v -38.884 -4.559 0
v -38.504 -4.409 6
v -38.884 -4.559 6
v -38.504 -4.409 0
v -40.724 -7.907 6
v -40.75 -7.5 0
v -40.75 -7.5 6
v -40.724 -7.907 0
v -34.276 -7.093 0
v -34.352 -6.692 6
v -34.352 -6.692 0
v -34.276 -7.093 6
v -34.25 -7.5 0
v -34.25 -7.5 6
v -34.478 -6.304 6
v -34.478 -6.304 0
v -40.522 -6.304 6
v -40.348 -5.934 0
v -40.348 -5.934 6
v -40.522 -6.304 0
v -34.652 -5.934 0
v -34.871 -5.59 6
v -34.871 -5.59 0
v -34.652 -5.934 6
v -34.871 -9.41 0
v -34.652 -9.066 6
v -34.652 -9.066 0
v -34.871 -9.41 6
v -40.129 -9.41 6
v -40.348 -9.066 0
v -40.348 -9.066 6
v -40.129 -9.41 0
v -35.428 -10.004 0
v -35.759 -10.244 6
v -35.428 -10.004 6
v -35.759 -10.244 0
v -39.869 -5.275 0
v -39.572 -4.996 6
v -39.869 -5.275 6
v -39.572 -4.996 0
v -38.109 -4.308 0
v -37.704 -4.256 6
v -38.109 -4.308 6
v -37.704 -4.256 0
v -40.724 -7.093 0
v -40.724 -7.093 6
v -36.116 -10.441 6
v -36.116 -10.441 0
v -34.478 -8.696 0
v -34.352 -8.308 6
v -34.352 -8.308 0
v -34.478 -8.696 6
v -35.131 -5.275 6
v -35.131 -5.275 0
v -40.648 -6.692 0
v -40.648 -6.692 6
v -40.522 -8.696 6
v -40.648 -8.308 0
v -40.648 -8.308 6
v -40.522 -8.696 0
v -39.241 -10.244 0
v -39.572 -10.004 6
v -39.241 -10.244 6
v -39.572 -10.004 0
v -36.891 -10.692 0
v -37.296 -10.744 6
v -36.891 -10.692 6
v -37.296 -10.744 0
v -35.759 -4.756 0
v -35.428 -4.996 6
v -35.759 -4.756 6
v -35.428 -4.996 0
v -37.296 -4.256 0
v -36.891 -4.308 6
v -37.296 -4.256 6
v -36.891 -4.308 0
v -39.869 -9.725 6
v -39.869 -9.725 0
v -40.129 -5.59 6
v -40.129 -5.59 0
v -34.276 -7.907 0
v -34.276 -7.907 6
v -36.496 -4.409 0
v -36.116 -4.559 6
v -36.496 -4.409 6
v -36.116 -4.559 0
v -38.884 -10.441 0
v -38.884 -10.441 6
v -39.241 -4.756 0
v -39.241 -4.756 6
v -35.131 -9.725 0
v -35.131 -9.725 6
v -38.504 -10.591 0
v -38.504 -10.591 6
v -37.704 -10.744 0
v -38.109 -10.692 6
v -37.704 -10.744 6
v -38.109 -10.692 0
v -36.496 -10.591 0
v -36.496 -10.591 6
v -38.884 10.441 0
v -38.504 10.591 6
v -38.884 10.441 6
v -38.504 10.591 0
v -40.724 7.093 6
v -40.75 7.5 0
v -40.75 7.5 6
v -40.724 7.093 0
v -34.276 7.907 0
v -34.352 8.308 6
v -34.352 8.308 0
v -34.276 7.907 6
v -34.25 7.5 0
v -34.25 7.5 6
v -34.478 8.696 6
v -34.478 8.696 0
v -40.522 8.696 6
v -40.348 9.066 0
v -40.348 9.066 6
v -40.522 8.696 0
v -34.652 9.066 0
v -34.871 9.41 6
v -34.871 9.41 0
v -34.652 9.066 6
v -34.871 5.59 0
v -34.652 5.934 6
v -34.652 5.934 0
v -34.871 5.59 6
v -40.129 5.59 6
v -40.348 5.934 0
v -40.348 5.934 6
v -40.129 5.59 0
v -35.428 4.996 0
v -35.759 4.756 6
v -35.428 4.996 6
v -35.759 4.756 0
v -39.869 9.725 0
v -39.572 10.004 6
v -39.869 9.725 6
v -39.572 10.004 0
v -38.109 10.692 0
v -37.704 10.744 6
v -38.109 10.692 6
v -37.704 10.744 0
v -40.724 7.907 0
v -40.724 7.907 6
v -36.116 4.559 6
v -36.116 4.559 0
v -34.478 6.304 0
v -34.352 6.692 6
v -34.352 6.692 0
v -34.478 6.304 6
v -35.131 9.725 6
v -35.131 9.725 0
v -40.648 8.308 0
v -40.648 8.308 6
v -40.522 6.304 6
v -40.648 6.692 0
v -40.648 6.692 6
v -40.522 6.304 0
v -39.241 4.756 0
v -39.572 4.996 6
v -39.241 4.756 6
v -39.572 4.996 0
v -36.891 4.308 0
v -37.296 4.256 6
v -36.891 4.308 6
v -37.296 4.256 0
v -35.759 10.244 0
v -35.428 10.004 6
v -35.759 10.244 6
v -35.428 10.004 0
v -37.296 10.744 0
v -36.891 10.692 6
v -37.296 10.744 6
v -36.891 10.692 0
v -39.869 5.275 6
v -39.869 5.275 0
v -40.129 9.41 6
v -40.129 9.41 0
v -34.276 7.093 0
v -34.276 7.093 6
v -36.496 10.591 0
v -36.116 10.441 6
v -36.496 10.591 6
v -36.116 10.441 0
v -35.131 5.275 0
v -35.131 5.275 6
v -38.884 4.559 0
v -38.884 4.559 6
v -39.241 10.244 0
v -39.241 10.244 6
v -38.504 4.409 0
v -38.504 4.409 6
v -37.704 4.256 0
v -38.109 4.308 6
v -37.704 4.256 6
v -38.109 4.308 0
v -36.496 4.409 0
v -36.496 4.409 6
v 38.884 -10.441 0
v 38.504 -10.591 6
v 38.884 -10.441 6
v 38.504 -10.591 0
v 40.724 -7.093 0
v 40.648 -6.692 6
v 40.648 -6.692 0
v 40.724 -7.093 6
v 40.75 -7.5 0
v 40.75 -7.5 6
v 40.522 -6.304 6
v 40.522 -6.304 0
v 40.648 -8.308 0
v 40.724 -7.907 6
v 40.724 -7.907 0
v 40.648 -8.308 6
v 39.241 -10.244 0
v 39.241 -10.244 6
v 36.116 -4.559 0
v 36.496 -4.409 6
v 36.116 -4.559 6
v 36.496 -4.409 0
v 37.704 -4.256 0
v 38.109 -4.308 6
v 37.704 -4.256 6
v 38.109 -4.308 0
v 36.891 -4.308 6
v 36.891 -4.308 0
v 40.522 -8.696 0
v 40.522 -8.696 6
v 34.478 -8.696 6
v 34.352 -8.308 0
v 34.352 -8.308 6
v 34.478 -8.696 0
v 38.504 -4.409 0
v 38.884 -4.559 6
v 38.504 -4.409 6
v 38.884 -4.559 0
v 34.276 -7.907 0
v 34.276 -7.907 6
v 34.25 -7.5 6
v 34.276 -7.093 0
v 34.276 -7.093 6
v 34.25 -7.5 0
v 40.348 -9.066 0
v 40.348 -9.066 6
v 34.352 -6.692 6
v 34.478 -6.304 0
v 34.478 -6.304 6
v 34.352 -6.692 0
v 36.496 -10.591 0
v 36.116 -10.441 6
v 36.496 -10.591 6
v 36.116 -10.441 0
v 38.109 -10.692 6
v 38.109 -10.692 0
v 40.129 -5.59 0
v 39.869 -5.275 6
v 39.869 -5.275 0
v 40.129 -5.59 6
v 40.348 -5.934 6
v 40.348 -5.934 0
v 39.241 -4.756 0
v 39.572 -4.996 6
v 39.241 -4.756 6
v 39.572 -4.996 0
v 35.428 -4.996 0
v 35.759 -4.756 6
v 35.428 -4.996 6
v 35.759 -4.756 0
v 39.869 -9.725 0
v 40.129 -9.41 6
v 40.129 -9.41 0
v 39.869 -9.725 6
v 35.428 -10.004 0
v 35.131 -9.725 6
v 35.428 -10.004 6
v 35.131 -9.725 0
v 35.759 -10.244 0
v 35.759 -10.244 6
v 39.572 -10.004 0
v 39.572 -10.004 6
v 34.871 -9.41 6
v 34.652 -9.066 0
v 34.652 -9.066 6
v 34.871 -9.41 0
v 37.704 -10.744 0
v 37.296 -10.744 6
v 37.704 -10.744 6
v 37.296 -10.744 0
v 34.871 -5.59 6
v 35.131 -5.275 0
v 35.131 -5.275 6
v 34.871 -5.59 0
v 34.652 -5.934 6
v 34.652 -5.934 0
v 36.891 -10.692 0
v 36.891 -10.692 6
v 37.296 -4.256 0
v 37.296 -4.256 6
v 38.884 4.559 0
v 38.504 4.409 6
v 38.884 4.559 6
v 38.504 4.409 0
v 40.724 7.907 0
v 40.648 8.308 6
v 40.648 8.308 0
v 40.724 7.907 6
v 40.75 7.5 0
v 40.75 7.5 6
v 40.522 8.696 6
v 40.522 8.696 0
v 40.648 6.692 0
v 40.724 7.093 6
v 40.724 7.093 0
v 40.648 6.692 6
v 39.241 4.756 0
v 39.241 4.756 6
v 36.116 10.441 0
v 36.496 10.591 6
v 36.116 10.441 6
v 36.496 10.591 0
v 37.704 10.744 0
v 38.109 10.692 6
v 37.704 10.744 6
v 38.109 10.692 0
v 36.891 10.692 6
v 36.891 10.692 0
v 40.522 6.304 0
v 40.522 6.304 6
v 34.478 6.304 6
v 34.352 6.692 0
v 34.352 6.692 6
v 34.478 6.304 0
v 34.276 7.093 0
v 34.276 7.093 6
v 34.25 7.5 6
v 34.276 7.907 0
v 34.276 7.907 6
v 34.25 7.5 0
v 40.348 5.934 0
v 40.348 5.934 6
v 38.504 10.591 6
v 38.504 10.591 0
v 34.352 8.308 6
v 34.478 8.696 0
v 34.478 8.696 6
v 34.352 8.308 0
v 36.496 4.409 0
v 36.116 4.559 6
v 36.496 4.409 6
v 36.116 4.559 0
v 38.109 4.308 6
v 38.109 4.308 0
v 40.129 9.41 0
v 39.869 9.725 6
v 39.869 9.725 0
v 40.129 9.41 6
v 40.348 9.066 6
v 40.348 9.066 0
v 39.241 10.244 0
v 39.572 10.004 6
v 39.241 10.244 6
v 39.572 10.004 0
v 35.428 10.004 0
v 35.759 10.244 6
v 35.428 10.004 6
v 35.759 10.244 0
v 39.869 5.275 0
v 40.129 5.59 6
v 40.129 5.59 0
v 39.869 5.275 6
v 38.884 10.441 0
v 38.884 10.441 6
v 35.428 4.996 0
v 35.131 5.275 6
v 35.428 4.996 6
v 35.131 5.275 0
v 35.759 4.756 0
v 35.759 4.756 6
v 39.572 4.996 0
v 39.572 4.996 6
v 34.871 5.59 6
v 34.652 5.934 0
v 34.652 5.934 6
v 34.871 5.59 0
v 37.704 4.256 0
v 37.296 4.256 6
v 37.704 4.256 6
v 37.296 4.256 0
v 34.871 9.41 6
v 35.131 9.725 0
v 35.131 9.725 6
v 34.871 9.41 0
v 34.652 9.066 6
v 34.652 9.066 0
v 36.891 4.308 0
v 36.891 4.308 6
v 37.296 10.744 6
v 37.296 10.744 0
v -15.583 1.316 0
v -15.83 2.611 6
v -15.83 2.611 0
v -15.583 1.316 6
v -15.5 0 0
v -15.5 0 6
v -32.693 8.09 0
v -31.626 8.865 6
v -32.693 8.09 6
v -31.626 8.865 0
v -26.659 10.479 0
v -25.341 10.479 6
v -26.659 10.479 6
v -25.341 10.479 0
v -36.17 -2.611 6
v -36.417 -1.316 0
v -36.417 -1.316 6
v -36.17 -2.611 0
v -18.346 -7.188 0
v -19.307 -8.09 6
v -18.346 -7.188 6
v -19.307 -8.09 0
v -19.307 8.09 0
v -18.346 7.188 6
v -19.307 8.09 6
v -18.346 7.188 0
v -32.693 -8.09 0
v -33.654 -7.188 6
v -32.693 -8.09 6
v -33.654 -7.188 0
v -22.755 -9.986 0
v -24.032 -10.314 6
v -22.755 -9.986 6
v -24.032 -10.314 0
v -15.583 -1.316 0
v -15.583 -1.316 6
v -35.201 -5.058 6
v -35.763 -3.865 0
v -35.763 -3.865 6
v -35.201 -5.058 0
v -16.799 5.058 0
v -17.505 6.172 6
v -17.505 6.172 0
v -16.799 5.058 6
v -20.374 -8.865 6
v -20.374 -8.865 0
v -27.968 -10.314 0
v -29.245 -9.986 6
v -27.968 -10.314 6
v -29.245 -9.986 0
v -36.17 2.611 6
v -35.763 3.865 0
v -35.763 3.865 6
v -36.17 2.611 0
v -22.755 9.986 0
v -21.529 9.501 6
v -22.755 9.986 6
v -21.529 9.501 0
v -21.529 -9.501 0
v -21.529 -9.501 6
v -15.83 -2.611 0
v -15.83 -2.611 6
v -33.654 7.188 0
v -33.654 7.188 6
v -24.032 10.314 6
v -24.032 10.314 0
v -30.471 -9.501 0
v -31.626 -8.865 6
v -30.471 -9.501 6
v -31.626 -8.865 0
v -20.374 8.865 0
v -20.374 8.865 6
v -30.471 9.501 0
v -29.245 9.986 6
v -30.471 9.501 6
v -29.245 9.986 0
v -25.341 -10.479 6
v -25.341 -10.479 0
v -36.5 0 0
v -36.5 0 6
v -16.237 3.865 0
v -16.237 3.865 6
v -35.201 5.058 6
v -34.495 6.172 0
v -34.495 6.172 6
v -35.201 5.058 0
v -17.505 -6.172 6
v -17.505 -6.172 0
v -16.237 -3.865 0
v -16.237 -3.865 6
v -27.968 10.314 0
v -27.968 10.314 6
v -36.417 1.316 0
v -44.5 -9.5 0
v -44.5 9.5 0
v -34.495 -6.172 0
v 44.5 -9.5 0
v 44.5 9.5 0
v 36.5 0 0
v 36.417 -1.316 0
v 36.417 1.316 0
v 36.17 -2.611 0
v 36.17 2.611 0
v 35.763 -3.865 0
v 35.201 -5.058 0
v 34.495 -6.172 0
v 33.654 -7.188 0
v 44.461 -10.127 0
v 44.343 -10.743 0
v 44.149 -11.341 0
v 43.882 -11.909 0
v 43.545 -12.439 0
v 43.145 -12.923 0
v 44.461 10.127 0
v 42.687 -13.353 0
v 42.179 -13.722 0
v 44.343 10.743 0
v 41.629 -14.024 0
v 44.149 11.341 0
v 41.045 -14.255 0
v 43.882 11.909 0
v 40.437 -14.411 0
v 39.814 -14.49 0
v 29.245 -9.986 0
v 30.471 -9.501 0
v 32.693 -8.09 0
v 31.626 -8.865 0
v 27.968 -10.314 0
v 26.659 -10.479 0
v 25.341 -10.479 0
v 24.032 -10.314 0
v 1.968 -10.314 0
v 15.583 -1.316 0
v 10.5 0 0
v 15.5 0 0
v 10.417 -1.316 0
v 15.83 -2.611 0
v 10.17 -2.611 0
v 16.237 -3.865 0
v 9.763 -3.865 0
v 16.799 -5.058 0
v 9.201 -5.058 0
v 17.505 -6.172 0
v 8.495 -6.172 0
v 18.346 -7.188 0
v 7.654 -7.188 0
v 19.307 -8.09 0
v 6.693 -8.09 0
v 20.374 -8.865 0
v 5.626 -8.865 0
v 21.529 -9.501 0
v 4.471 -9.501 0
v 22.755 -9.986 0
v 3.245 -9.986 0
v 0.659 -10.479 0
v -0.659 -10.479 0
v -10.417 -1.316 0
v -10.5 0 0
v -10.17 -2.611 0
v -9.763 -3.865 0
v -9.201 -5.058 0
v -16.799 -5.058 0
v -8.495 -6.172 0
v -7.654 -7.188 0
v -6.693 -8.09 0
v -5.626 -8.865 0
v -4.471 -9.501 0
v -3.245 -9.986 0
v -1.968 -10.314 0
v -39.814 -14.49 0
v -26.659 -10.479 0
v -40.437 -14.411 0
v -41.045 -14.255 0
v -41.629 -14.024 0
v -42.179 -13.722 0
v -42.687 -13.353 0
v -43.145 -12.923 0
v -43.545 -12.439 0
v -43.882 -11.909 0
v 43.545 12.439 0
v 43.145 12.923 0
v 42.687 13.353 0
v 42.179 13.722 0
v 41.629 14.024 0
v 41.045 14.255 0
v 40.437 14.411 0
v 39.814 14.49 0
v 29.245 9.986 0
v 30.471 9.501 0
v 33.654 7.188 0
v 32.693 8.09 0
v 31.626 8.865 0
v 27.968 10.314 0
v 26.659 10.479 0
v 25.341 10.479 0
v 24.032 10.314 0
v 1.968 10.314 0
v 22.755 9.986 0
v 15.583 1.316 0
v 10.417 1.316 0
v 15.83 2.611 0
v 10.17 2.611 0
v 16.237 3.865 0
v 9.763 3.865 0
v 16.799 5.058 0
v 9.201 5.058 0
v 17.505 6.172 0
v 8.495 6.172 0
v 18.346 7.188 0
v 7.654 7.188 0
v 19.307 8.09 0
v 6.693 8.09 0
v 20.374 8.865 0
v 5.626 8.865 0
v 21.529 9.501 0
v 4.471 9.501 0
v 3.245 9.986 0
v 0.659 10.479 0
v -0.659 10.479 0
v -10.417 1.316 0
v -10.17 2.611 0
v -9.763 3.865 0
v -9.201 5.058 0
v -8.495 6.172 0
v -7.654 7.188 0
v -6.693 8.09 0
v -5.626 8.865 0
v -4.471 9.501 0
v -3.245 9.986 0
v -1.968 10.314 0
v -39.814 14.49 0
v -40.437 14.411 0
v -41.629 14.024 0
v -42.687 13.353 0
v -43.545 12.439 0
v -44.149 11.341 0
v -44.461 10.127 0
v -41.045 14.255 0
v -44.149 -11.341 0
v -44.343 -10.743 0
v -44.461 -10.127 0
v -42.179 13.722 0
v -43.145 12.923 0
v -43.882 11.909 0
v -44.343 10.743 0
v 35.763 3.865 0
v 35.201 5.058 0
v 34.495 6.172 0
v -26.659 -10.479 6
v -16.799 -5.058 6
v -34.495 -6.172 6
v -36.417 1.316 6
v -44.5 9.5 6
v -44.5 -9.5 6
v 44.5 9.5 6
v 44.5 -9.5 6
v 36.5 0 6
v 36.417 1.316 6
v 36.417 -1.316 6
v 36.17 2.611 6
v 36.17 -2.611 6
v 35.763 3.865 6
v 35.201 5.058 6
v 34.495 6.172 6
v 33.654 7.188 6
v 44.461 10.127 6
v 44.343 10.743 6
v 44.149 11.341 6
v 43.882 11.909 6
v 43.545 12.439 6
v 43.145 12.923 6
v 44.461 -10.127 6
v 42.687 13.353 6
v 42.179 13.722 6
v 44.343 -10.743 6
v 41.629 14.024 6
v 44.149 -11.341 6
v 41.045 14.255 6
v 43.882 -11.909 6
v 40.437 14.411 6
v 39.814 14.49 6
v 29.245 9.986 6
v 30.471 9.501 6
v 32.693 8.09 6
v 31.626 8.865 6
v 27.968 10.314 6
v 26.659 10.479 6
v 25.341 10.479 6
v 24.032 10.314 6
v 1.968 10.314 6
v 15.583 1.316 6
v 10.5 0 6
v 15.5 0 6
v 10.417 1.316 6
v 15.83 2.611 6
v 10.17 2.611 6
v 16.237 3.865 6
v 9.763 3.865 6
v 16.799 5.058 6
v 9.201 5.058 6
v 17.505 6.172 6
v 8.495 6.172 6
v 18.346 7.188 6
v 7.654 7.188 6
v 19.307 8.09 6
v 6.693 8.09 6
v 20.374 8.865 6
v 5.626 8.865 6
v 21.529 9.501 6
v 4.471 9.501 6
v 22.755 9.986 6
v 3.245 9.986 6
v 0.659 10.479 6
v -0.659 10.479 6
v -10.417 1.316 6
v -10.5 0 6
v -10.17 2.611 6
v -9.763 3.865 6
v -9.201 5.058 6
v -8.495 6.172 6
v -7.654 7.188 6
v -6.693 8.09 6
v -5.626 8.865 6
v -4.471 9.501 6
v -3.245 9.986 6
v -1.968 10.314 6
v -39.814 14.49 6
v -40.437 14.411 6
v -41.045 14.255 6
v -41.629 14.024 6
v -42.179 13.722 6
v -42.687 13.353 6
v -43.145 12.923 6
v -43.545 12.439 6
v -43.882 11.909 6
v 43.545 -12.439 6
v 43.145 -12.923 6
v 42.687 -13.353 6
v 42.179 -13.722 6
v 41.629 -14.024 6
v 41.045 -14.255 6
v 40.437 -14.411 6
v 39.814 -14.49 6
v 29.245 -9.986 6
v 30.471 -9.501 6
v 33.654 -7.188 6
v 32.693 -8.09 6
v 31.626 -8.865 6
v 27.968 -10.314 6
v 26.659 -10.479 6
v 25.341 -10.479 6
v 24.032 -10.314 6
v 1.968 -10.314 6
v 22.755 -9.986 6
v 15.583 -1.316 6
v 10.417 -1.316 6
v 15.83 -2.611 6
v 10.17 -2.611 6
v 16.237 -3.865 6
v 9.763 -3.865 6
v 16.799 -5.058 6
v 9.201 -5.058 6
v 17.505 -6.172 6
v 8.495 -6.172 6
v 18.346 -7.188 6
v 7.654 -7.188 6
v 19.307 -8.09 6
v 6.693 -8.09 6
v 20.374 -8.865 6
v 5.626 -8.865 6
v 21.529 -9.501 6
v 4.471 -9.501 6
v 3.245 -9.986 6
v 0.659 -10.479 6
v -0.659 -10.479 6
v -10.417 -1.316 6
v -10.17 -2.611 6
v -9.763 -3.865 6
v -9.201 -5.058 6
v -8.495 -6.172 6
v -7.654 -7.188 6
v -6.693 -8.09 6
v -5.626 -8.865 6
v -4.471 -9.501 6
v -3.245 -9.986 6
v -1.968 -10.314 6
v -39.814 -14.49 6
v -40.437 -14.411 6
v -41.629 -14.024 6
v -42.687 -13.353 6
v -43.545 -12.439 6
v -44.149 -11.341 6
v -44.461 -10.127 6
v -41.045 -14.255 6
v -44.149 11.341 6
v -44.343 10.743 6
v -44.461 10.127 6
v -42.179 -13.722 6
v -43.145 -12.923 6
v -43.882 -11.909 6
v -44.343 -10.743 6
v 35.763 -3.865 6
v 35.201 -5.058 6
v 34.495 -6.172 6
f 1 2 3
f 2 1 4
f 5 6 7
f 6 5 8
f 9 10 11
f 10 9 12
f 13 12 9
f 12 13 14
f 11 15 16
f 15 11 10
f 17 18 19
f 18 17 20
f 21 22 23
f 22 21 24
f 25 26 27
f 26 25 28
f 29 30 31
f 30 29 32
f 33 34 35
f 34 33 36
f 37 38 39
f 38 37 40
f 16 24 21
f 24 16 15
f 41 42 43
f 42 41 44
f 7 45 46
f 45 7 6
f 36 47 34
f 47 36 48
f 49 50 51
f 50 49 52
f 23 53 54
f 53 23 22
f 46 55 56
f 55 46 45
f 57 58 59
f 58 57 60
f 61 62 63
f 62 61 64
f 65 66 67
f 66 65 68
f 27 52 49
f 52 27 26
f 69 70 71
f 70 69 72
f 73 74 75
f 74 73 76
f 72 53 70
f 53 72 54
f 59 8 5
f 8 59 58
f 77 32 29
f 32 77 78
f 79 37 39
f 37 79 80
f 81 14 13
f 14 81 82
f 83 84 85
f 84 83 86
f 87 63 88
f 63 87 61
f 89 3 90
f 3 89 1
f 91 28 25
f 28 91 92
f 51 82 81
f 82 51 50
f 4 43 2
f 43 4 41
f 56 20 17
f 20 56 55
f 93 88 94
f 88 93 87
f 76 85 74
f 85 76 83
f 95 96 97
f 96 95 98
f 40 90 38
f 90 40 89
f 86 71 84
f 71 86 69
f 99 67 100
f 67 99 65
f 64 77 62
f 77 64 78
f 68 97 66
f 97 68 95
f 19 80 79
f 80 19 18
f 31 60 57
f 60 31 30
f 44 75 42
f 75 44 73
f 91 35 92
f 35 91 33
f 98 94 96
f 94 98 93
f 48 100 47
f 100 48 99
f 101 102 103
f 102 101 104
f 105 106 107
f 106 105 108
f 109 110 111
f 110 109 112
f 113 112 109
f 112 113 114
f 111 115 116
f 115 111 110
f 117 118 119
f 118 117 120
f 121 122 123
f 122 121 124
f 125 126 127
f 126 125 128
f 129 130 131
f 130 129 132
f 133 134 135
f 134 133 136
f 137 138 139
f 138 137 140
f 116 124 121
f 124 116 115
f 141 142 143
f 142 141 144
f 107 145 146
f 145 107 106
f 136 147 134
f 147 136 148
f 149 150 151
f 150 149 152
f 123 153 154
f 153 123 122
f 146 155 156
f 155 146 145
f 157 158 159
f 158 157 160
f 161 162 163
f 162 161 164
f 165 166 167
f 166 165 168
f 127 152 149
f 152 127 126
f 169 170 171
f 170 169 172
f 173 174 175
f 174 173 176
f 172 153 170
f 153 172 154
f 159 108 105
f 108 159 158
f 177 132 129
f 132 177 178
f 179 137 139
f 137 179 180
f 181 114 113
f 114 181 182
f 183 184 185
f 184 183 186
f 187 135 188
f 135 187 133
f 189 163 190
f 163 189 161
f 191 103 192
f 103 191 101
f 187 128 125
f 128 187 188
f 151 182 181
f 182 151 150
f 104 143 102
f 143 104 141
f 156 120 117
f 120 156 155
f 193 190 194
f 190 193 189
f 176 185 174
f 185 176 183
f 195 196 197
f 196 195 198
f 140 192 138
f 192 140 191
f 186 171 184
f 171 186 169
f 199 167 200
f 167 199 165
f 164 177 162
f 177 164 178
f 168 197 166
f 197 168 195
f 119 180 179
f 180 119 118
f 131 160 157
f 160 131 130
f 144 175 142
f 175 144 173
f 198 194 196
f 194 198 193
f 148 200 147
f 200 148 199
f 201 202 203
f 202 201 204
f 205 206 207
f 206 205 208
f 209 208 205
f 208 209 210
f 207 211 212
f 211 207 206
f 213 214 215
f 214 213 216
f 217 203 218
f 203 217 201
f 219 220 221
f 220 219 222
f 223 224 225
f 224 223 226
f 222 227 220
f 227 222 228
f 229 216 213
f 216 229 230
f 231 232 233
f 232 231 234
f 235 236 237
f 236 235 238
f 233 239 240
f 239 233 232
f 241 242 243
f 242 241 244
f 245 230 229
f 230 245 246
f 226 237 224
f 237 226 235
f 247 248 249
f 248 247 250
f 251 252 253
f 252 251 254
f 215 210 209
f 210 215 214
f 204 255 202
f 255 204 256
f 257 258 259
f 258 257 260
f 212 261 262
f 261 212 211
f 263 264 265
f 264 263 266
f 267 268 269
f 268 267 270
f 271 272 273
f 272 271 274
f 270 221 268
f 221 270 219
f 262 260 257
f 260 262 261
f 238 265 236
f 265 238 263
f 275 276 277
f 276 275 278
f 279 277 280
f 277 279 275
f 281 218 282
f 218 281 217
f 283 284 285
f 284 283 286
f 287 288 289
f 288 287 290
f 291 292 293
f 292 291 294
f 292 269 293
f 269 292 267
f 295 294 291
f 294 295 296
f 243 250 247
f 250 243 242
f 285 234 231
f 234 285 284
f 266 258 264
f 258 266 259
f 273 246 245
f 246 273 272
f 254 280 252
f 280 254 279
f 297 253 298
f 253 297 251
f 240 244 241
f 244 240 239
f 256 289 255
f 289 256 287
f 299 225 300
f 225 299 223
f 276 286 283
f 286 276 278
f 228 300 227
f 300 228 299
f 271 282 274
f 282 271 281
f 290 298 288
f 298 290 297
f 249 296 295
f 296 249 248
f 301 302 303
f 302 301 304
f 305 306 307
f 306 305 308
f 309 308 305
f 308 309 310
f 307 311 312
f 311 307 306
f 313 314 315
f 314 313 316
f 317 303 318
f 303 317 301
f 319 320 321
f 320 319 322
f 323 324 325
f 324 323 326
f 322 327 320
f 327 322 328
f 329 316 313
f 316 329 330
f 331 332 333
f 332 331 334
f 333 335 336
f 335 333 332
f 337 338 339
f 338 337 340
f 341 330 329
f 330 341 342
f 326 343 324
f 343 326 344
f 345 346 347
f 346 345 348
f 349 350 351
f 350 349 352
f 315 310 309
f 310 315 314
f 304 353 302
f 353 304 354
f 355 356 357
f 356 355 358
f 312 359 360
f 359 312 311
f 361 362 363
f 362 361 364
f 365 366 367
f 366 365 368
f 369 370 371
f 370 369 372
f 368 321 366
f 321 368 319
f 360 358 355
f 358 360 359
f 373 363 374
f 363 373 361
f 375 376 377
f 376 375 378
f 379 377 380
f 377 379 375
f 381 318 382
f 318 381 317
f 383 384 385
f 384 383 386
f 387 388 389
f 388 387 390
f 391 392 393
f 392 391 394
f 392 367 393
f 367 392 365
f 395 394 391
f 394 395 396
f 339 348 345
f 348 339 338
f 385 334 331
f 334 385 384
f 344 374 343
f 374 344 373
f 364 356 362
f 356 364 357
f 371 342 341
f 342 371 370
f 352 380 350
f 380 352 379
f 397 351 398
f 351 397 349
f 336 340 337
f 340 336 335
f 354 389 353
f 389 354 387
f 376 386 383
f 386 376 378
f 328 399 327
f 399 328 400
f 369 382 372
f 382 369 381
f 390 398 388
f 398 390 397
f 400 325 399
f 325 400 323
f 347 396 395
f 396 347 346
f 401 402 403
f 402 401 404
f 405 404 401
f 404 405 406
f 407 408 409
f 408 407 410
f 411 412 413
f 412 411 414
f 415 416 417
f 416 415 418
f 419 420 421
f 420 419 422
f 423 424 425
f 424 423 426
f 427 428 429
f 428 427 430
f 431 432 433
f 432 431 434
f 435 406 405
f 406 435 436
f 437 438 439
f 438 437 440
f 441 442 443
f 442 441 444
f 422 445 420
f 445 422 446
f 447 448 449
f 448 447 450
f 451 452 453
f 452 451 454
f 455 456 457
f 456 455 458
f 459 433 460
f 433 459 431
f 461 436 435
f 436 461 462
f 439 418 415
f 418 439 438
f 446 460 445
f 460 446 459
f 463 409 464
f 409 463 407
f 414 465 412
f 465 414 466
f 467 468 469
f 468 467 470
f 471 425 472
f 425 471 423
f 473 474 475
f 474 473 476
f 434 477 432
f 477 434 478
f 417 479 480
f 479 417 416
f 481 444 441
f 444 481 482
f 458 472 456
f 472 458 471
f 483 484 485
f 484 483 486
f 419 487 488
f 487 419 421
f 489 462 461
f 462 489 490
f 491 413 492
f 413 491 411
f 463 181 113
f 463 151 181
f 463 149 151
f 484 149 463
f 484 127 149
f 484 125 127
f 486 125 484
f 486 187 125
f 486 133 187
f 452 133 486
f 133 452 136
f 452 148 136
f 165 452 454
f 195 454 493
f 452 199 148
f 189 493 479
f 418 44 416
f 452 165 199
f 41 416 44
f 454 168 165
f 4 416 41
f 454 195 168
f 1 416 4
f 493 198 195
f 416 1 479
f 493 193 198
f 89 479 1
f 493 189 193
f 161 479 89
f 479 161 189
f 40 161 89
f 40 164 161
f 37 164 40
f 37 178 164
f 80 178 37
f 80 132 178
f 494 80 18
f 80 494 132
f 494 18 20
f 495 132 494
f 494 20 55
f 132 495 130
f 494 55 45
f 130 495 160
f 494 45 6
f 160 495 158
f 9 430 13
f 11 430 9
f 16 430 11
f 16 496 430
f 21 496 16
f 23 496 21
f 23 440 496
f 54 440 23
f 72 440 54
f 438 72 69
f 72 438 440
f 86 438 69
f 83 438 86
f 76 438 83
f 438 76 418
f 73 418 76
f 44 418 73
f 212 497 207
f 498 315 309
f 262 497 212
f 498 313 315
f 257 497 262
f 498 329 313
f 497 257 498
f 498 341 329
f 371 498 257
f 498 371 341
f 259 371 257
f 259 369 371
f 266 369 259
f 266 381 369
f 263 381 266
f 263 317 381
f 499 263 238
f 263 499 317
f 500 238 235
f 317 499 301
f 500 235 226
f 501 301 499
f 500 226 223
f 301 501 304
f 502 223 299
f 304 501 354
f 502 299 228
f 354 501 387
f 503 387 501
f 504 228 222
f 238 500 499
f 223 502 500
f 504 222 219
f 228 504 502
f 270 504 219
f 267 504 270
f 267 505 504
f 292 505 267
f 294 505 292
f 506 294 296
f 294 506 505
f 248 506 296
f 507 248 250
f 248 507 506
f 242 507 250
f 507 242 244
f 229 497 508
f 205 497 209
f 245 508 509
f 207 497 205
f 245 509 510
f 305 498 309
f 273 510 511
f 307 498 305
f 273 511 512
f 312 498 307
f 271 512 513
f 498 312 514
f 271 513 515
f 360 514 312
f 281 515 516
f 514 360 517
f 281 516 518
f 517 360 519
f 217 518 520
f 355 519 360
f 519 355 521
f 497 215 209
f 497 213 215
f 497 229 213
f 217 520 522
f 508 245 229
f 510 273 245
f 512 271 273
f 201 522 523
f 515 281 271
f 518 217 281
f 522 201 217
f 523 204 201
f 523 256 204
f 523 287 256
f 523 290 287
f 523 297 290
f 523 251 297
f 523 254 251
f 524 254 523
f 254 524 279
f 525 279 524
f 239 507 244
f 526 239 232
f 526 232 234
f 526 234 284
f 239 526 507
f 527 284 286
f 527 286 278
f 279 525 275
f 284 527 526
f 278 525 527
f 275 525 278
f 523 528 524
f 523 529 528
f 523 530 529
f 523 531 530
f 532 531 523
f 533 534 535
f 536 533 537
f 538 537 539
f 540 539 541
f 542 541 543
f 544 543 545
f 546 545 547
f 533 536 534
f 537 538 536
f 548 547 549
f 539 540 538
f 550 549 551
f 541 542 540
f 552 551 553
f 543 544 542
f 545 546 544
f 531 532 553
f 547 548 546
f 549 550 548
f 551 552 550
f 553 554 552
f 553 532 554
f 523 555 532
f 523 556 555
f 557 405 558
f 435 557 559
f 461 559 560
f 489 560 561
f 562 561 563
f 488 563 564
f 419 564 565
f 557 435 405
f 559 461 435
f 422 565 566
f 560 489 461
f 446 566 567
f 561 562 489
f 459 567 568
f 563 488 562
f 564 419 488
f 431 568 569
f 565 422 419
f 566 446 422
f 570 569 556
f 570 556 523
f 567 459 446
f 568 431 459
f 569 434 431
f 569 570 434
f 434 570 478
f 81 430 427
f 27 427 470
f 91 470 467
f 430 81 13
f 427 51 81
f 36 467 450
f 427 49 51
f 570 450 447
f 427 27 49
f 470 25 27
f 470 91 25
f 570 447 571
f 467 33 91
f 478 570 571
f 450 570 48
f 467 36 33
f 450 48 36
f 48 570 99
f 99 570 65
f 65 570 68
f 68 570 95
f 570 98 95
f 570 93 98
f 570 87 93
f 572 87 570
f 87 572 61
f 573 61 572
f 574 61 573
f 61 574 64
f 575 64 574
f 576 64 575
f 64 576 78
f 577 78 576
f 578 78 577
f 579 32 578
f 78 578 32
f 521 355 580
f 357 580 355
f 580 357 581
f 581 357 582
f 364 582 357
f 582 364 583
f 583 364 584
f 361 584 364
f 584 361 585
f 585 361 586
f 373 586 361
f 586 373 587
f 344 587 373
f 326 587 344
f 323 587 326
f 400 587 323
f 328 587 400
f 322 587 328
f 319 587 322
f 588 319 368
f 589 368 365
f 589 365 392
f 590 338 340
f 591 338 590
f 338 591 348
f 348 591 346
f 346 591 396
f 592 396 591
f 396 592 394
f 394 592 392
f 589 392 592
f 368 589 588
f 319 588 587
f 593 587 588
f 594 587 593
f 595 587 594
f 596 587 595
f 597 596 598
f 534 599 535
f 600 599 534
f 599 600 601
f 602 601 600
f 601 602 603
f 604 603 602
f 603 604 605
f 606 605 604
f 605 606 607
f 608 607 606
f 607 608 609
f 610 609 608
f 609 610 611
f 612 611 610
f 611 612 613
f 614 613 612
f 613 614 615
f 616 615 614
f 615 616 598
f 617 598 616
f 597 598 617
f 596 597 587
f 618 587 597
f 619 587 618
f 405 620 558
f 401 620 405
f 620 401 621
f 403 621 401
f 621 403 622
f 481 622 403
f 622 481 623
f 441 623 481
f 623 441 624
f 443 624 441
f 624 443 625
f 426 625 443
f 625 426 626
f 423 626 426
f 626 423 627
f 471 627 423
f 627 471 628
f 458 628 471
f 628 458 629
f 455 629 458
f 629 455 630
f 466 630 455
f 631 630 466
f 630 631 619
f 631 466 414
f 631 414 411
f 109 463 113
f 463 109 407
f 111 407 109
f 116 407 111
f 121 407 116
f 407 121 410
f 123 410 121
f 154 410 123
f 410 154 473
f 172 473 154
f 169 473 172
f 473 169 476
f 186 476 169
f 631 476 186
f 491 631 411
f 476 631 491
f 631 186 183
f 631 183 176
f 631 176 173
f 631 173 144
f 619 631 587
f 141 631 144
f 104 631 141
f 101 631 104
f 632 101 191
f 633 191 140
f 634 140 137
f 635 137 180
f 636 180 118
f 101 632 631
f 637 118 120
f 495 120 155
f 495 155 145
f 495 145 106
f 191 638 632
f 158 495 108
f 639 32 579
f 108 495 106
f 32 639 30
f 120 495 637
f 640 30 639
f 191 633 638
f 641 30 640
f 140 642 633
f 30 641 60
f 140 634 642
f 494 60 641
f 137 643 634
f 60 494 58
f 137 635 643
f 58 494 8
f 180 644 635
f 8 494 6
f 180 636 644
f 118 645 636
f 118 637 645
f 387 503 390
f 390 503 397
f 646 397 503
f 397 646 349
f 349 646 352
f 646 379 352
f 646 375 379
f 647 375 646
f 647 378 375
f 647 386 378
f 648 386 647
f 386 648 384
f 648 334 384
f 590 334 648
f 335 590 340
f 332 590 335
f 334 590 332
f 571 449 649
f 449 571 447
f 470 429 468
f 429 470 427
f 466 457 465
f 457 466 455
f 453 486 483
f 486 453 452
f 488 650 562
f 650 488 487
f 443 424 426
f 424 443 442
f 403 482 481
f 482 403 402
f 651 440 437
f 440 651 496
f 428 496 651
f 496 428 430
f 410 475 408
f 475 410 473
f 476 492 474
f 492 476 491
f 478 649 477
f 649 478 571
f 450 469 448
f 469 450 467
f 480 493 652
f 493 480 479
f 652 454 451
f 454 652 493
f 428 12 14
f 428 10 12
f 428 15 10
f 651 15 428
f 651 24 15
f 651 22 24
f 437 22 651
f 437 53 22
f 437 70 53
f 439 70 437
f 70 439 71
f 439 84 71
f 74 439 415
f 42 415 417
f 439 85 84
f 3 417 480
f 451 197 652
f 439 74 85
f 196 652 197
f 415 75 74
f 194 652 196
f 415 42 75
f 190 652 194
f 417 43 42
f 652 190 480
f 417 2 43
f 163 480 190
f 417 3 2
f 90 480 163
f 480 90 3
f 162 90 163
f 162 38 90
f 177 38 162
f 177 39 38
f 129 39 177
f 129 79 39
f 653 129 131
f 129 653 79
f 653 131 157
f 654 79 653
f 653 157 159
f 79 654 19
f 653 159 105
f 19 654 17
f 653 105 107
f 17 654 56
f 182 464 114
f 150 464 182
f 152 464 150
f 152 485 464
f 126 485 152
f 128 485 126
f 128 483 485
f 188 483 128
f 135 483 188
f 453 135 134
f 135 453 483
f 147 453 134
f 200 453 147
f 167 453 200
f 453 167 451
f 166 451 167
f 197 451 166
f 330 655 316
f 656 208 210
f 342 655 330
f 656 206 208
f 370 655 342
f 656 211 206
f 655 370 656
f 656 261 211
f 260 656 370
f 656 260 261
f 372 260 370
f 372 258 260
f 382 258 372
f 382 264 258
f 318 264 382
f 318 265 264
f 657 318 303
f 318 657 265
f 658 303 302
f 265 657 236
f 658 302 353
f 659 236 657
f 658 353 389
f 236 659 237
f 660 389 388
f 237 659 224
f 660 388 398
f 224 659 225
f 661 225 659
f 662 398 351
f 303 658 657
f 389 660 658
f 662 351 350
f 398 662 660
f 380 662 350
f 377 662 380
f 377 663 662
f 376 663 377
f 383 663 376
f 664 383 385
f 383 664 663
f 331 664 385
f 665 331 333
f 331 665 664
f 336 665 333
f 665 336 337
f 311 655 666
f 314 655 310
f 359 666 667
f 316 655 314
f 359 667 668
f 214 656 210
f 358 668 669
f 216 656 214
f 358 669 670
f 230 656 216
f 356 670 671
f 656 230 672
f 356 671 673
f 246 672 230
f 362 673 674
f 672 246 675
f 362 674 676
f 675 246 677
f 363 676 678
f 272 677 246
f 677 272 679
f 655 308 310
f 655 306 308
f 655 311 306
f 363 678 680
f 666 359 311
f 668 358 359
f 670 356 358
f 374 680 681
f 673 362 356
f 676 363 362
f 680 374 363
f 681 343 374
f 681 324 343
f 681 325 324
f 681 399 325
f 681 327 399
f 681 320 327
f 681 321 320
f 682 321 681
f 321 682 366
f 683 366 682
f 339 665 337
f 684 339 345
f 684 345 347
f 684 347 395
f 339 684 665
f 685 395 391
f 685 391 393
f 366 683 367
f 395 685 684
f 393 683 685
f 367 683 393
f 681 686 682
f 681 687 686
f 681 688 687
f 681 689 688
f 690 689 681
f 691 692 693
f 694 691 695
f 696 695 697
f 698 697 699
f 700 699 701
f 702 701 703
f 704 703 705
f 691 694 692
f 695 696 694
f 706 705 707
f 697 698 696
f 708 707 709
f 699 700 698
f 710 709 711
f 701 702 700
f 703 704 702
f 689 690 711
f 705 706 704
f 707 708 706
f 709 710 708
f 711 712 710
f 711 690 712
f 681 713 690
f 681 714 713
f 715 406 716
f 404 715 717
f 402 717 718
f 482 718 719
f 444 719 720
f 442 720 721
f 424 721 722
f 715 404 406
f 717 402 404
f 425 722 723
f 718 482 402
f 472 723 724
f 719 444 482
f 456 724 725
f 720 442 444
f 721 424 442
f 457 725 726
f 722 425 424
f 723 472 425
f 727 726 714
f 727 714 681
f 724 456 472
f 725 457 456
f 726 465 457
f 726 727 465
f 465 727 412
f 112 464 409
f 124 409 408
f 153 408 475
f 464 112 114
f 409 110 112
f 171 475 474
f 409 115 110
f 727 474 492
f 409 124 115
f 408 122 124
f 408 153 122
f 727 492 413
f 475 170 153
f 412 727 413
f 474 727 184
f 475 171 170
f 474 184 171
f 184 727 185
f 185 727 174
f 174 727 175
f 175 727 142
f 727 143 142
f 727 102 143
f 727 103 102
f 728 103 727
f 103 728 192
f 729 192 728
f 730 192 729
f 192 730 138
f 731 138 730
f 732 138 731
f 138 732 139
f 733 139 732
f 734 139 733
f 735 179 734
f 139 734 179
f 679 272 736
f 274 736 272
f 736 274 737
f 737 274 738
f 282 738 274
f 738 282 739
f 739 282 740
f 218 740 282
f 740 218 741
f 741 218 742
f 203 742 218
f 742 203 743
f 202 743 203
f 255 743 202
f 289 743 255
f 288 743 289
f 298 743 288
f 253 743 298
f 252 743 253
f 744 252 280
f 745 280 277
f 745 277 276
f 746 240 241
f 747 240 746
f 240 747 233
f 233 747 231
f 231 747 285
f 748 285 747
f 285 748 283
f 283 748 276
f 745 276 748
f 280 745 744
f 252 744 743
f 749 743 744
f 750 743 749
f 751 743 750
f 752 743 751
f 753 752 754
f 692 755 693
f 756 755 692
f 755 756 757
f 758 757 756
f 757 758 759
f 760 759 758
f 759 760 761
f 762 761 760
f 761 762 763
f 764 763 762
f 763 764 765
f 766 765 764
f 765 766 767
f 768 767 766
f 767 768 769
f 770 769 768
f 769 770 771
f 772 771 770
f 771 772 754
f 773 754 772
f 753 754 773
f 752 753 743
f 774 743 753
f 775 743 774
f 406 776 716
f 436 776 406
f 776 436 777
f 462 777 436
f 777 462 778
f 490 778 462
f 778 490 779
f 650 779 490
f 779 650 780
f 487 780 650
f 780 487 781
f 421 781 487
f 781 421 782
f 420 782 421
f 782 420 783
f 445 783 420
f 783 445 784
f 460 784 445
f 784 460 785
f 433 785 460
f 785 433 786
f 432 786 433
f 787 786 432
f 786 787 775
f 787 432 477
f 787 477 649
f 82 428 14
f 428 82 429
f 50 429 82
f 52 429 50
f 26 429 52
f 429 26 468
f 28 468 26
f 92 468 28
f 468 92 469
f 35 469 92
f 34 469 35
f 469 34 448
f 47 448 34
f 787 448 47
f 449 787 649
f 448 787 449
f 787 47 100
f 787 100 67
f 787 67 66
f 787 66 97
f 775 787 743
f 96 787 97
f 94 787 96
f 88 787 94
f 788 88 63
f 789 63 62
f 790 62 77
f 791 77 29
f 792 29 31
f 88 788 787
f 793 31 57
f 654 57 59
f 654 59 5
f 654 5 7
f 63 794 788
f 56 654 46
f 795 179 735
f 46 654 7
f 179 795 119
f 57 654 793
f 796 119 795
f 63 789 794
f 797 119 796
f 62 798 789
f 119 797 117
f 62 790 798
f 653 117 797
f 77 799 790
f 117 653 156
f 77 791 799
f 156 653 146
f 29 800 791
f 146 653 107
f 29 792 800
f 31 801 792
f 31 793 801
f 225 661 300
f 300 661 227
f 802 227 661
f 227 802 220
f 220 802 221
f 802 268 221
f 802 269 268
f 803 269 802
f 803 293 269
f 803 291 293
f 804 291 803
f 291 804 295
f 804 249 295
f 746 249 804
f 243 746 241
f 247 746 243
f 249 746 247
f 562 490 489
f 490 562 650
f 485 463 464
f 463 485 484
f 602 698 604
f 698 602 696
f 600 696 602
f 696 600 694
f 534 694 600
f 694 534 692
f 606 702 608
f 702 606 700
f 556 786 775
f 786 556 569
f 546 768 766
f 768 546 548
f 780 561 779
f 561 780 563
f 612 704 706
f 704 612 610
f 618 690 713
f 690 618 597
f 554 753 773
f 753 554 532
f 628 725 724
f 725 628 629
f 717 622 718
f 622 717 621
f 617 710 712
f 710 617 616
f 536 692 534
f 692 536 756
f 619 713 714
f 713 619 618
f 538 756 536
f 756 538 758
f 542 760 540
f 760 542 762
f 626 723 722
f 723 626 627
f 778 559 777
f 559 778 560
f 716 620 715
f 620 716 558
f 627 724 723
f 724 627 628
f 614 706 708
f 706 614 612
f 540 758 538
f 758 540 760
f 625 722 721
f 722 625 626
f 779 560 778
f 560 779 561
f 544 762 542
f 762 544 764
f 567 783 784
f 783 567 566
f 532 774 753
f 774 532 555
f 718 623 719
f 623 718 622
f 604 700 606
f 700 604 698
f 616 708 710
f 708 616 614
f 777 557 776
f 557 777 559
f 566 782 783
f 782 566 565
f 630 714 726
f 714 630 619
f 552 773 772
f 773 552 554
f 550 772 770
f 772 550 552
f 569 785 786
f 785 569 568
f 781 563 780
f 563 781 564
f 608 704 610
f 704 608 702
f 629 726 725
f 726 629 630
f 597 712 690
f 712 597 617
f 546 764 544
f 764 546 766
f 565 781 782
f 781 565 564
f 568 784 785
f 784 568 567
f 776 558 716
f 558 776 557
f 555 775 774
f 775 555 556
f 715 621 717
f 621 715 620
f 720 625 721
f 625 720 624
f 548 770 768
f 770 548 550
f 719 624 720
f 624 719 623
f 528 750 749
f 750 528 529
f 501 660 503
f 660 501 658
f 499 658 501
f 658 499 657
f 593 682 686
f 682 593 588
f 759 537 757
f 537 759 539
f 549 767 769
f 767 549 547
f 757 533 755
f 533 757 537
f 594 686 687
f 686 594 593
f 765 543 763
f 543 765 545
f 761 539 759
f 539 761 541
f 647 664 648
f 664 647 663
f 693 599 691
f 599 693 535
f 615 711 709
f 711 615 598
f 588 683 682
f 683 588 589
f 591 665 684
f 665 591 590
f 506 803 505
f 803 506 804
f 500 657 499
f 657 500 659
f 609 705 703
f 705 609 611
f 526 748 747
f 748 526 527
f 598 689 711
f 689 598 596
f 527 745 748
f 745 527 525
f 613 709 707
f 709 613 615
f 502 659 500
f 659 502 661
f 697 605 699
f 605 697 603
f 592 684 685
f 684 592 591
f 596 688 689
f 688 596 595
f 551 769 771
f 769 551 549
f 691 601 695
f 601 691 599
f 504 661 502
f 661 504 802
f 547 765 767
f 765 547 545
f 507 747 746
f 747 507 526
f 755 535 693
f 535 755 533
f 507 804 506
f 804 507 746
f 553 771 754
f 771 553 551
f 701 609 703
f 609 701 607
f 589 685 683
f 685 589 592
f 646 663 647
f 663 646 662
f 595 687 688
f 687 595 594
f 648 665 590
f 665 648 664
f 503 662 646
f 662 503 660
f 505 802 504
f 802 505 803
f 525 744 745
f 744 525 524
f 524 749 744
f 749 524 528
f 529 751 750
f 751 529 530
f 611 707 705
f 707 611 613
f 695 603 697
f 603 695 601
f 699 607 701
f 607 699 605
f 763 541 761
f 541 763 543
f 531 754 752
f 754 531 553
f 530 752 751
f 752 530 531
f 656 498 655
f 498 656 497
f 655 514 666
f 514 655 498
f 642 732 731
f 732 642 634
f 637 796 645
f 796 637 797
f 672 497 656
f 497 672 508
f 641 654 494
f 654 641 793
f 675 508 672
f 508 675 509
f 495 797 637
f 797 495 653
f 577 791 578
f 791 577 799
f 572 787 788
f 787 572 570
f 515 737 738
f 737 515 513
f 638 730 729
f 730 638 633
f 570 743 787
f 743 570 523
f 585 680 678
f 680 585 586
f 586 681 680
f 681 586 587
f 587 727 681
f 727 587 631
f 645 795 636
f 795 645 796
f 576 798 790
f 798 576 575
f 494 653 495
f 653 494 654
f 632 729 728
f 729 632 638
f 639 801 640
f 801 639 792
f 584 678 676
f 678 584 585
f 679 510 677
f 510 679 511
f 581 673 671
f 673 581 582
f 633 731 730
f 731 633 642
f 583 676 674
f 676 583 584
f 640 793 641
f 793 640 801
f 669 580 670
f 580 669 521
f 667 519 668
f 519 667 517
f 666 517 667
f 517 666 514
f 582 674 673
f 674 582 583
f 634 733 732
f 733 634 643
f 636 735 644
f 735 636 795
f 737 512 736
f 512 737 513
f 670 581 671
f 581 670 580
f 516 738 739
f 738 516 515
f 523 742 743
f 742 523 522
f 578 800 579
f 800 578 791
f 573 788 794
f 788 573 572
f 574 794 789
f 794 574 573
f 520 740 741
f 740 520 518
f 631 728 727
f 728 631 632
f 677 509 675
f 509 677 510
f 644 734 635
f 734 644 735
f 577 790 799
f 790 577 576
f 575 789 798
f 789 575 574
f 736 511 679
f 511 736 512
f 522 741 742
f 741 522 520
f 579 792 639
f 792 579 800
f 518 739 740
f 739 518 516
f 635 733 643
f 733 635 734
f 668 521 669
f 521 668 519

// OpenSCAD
$fn = 50;


difference() {
	union() {
		hull() {
			translate(v = [-39.5000000000, 9.5000000000, 0]) {
				cylinder(h = 6, r = 5);
			}
			translate(v = [39.5000000000, 9.5000000000, 0]) {
				cylinder(h = 6, r = 5);
			}
			translate(v = [-39.5000000000, -9.5000000000, 0]) {
				cylinder(h = 6, r = 5);
			}
			translate(v = [39.5000000000, -9.5000000000, 0]) {
				cylinder(h = 6, r = 5);
			}
		}
	}
	union() {
		#translate(v = [-37.5000000000, -7.5000000000, -100.0000000000]) {
			cylinder(h = 200, r = 3.2500000000);
		}
		#translate(v = [-37.5000000000, 7.5000000000, -100.0000000000]) {
			cylinder(h = 200, r = 3.2500000000);
		}
		#translate(v = [37.5000000000, -7.5000000000, -100.0000000000]) {
			cylinder(h = 200, r = 3.2500000000);
		}
		#translate(v = [37.5000000000, 7.5000000000, -100.0000000000]) {
			cylinder(h = 200, r = 3.2500000000);
		}
		#translate(v = [-26.0000000000, 0, 0]) {
			cylinder(h = 6, r = 10.5000000000);
		}
		#cylinder(h = 6, r = 10.5000000000);
		#translate(v = [26.0000000000, 0, 0]) {
			cylinder(h = 6, r = 10.5000000000);
		}
	}
}
